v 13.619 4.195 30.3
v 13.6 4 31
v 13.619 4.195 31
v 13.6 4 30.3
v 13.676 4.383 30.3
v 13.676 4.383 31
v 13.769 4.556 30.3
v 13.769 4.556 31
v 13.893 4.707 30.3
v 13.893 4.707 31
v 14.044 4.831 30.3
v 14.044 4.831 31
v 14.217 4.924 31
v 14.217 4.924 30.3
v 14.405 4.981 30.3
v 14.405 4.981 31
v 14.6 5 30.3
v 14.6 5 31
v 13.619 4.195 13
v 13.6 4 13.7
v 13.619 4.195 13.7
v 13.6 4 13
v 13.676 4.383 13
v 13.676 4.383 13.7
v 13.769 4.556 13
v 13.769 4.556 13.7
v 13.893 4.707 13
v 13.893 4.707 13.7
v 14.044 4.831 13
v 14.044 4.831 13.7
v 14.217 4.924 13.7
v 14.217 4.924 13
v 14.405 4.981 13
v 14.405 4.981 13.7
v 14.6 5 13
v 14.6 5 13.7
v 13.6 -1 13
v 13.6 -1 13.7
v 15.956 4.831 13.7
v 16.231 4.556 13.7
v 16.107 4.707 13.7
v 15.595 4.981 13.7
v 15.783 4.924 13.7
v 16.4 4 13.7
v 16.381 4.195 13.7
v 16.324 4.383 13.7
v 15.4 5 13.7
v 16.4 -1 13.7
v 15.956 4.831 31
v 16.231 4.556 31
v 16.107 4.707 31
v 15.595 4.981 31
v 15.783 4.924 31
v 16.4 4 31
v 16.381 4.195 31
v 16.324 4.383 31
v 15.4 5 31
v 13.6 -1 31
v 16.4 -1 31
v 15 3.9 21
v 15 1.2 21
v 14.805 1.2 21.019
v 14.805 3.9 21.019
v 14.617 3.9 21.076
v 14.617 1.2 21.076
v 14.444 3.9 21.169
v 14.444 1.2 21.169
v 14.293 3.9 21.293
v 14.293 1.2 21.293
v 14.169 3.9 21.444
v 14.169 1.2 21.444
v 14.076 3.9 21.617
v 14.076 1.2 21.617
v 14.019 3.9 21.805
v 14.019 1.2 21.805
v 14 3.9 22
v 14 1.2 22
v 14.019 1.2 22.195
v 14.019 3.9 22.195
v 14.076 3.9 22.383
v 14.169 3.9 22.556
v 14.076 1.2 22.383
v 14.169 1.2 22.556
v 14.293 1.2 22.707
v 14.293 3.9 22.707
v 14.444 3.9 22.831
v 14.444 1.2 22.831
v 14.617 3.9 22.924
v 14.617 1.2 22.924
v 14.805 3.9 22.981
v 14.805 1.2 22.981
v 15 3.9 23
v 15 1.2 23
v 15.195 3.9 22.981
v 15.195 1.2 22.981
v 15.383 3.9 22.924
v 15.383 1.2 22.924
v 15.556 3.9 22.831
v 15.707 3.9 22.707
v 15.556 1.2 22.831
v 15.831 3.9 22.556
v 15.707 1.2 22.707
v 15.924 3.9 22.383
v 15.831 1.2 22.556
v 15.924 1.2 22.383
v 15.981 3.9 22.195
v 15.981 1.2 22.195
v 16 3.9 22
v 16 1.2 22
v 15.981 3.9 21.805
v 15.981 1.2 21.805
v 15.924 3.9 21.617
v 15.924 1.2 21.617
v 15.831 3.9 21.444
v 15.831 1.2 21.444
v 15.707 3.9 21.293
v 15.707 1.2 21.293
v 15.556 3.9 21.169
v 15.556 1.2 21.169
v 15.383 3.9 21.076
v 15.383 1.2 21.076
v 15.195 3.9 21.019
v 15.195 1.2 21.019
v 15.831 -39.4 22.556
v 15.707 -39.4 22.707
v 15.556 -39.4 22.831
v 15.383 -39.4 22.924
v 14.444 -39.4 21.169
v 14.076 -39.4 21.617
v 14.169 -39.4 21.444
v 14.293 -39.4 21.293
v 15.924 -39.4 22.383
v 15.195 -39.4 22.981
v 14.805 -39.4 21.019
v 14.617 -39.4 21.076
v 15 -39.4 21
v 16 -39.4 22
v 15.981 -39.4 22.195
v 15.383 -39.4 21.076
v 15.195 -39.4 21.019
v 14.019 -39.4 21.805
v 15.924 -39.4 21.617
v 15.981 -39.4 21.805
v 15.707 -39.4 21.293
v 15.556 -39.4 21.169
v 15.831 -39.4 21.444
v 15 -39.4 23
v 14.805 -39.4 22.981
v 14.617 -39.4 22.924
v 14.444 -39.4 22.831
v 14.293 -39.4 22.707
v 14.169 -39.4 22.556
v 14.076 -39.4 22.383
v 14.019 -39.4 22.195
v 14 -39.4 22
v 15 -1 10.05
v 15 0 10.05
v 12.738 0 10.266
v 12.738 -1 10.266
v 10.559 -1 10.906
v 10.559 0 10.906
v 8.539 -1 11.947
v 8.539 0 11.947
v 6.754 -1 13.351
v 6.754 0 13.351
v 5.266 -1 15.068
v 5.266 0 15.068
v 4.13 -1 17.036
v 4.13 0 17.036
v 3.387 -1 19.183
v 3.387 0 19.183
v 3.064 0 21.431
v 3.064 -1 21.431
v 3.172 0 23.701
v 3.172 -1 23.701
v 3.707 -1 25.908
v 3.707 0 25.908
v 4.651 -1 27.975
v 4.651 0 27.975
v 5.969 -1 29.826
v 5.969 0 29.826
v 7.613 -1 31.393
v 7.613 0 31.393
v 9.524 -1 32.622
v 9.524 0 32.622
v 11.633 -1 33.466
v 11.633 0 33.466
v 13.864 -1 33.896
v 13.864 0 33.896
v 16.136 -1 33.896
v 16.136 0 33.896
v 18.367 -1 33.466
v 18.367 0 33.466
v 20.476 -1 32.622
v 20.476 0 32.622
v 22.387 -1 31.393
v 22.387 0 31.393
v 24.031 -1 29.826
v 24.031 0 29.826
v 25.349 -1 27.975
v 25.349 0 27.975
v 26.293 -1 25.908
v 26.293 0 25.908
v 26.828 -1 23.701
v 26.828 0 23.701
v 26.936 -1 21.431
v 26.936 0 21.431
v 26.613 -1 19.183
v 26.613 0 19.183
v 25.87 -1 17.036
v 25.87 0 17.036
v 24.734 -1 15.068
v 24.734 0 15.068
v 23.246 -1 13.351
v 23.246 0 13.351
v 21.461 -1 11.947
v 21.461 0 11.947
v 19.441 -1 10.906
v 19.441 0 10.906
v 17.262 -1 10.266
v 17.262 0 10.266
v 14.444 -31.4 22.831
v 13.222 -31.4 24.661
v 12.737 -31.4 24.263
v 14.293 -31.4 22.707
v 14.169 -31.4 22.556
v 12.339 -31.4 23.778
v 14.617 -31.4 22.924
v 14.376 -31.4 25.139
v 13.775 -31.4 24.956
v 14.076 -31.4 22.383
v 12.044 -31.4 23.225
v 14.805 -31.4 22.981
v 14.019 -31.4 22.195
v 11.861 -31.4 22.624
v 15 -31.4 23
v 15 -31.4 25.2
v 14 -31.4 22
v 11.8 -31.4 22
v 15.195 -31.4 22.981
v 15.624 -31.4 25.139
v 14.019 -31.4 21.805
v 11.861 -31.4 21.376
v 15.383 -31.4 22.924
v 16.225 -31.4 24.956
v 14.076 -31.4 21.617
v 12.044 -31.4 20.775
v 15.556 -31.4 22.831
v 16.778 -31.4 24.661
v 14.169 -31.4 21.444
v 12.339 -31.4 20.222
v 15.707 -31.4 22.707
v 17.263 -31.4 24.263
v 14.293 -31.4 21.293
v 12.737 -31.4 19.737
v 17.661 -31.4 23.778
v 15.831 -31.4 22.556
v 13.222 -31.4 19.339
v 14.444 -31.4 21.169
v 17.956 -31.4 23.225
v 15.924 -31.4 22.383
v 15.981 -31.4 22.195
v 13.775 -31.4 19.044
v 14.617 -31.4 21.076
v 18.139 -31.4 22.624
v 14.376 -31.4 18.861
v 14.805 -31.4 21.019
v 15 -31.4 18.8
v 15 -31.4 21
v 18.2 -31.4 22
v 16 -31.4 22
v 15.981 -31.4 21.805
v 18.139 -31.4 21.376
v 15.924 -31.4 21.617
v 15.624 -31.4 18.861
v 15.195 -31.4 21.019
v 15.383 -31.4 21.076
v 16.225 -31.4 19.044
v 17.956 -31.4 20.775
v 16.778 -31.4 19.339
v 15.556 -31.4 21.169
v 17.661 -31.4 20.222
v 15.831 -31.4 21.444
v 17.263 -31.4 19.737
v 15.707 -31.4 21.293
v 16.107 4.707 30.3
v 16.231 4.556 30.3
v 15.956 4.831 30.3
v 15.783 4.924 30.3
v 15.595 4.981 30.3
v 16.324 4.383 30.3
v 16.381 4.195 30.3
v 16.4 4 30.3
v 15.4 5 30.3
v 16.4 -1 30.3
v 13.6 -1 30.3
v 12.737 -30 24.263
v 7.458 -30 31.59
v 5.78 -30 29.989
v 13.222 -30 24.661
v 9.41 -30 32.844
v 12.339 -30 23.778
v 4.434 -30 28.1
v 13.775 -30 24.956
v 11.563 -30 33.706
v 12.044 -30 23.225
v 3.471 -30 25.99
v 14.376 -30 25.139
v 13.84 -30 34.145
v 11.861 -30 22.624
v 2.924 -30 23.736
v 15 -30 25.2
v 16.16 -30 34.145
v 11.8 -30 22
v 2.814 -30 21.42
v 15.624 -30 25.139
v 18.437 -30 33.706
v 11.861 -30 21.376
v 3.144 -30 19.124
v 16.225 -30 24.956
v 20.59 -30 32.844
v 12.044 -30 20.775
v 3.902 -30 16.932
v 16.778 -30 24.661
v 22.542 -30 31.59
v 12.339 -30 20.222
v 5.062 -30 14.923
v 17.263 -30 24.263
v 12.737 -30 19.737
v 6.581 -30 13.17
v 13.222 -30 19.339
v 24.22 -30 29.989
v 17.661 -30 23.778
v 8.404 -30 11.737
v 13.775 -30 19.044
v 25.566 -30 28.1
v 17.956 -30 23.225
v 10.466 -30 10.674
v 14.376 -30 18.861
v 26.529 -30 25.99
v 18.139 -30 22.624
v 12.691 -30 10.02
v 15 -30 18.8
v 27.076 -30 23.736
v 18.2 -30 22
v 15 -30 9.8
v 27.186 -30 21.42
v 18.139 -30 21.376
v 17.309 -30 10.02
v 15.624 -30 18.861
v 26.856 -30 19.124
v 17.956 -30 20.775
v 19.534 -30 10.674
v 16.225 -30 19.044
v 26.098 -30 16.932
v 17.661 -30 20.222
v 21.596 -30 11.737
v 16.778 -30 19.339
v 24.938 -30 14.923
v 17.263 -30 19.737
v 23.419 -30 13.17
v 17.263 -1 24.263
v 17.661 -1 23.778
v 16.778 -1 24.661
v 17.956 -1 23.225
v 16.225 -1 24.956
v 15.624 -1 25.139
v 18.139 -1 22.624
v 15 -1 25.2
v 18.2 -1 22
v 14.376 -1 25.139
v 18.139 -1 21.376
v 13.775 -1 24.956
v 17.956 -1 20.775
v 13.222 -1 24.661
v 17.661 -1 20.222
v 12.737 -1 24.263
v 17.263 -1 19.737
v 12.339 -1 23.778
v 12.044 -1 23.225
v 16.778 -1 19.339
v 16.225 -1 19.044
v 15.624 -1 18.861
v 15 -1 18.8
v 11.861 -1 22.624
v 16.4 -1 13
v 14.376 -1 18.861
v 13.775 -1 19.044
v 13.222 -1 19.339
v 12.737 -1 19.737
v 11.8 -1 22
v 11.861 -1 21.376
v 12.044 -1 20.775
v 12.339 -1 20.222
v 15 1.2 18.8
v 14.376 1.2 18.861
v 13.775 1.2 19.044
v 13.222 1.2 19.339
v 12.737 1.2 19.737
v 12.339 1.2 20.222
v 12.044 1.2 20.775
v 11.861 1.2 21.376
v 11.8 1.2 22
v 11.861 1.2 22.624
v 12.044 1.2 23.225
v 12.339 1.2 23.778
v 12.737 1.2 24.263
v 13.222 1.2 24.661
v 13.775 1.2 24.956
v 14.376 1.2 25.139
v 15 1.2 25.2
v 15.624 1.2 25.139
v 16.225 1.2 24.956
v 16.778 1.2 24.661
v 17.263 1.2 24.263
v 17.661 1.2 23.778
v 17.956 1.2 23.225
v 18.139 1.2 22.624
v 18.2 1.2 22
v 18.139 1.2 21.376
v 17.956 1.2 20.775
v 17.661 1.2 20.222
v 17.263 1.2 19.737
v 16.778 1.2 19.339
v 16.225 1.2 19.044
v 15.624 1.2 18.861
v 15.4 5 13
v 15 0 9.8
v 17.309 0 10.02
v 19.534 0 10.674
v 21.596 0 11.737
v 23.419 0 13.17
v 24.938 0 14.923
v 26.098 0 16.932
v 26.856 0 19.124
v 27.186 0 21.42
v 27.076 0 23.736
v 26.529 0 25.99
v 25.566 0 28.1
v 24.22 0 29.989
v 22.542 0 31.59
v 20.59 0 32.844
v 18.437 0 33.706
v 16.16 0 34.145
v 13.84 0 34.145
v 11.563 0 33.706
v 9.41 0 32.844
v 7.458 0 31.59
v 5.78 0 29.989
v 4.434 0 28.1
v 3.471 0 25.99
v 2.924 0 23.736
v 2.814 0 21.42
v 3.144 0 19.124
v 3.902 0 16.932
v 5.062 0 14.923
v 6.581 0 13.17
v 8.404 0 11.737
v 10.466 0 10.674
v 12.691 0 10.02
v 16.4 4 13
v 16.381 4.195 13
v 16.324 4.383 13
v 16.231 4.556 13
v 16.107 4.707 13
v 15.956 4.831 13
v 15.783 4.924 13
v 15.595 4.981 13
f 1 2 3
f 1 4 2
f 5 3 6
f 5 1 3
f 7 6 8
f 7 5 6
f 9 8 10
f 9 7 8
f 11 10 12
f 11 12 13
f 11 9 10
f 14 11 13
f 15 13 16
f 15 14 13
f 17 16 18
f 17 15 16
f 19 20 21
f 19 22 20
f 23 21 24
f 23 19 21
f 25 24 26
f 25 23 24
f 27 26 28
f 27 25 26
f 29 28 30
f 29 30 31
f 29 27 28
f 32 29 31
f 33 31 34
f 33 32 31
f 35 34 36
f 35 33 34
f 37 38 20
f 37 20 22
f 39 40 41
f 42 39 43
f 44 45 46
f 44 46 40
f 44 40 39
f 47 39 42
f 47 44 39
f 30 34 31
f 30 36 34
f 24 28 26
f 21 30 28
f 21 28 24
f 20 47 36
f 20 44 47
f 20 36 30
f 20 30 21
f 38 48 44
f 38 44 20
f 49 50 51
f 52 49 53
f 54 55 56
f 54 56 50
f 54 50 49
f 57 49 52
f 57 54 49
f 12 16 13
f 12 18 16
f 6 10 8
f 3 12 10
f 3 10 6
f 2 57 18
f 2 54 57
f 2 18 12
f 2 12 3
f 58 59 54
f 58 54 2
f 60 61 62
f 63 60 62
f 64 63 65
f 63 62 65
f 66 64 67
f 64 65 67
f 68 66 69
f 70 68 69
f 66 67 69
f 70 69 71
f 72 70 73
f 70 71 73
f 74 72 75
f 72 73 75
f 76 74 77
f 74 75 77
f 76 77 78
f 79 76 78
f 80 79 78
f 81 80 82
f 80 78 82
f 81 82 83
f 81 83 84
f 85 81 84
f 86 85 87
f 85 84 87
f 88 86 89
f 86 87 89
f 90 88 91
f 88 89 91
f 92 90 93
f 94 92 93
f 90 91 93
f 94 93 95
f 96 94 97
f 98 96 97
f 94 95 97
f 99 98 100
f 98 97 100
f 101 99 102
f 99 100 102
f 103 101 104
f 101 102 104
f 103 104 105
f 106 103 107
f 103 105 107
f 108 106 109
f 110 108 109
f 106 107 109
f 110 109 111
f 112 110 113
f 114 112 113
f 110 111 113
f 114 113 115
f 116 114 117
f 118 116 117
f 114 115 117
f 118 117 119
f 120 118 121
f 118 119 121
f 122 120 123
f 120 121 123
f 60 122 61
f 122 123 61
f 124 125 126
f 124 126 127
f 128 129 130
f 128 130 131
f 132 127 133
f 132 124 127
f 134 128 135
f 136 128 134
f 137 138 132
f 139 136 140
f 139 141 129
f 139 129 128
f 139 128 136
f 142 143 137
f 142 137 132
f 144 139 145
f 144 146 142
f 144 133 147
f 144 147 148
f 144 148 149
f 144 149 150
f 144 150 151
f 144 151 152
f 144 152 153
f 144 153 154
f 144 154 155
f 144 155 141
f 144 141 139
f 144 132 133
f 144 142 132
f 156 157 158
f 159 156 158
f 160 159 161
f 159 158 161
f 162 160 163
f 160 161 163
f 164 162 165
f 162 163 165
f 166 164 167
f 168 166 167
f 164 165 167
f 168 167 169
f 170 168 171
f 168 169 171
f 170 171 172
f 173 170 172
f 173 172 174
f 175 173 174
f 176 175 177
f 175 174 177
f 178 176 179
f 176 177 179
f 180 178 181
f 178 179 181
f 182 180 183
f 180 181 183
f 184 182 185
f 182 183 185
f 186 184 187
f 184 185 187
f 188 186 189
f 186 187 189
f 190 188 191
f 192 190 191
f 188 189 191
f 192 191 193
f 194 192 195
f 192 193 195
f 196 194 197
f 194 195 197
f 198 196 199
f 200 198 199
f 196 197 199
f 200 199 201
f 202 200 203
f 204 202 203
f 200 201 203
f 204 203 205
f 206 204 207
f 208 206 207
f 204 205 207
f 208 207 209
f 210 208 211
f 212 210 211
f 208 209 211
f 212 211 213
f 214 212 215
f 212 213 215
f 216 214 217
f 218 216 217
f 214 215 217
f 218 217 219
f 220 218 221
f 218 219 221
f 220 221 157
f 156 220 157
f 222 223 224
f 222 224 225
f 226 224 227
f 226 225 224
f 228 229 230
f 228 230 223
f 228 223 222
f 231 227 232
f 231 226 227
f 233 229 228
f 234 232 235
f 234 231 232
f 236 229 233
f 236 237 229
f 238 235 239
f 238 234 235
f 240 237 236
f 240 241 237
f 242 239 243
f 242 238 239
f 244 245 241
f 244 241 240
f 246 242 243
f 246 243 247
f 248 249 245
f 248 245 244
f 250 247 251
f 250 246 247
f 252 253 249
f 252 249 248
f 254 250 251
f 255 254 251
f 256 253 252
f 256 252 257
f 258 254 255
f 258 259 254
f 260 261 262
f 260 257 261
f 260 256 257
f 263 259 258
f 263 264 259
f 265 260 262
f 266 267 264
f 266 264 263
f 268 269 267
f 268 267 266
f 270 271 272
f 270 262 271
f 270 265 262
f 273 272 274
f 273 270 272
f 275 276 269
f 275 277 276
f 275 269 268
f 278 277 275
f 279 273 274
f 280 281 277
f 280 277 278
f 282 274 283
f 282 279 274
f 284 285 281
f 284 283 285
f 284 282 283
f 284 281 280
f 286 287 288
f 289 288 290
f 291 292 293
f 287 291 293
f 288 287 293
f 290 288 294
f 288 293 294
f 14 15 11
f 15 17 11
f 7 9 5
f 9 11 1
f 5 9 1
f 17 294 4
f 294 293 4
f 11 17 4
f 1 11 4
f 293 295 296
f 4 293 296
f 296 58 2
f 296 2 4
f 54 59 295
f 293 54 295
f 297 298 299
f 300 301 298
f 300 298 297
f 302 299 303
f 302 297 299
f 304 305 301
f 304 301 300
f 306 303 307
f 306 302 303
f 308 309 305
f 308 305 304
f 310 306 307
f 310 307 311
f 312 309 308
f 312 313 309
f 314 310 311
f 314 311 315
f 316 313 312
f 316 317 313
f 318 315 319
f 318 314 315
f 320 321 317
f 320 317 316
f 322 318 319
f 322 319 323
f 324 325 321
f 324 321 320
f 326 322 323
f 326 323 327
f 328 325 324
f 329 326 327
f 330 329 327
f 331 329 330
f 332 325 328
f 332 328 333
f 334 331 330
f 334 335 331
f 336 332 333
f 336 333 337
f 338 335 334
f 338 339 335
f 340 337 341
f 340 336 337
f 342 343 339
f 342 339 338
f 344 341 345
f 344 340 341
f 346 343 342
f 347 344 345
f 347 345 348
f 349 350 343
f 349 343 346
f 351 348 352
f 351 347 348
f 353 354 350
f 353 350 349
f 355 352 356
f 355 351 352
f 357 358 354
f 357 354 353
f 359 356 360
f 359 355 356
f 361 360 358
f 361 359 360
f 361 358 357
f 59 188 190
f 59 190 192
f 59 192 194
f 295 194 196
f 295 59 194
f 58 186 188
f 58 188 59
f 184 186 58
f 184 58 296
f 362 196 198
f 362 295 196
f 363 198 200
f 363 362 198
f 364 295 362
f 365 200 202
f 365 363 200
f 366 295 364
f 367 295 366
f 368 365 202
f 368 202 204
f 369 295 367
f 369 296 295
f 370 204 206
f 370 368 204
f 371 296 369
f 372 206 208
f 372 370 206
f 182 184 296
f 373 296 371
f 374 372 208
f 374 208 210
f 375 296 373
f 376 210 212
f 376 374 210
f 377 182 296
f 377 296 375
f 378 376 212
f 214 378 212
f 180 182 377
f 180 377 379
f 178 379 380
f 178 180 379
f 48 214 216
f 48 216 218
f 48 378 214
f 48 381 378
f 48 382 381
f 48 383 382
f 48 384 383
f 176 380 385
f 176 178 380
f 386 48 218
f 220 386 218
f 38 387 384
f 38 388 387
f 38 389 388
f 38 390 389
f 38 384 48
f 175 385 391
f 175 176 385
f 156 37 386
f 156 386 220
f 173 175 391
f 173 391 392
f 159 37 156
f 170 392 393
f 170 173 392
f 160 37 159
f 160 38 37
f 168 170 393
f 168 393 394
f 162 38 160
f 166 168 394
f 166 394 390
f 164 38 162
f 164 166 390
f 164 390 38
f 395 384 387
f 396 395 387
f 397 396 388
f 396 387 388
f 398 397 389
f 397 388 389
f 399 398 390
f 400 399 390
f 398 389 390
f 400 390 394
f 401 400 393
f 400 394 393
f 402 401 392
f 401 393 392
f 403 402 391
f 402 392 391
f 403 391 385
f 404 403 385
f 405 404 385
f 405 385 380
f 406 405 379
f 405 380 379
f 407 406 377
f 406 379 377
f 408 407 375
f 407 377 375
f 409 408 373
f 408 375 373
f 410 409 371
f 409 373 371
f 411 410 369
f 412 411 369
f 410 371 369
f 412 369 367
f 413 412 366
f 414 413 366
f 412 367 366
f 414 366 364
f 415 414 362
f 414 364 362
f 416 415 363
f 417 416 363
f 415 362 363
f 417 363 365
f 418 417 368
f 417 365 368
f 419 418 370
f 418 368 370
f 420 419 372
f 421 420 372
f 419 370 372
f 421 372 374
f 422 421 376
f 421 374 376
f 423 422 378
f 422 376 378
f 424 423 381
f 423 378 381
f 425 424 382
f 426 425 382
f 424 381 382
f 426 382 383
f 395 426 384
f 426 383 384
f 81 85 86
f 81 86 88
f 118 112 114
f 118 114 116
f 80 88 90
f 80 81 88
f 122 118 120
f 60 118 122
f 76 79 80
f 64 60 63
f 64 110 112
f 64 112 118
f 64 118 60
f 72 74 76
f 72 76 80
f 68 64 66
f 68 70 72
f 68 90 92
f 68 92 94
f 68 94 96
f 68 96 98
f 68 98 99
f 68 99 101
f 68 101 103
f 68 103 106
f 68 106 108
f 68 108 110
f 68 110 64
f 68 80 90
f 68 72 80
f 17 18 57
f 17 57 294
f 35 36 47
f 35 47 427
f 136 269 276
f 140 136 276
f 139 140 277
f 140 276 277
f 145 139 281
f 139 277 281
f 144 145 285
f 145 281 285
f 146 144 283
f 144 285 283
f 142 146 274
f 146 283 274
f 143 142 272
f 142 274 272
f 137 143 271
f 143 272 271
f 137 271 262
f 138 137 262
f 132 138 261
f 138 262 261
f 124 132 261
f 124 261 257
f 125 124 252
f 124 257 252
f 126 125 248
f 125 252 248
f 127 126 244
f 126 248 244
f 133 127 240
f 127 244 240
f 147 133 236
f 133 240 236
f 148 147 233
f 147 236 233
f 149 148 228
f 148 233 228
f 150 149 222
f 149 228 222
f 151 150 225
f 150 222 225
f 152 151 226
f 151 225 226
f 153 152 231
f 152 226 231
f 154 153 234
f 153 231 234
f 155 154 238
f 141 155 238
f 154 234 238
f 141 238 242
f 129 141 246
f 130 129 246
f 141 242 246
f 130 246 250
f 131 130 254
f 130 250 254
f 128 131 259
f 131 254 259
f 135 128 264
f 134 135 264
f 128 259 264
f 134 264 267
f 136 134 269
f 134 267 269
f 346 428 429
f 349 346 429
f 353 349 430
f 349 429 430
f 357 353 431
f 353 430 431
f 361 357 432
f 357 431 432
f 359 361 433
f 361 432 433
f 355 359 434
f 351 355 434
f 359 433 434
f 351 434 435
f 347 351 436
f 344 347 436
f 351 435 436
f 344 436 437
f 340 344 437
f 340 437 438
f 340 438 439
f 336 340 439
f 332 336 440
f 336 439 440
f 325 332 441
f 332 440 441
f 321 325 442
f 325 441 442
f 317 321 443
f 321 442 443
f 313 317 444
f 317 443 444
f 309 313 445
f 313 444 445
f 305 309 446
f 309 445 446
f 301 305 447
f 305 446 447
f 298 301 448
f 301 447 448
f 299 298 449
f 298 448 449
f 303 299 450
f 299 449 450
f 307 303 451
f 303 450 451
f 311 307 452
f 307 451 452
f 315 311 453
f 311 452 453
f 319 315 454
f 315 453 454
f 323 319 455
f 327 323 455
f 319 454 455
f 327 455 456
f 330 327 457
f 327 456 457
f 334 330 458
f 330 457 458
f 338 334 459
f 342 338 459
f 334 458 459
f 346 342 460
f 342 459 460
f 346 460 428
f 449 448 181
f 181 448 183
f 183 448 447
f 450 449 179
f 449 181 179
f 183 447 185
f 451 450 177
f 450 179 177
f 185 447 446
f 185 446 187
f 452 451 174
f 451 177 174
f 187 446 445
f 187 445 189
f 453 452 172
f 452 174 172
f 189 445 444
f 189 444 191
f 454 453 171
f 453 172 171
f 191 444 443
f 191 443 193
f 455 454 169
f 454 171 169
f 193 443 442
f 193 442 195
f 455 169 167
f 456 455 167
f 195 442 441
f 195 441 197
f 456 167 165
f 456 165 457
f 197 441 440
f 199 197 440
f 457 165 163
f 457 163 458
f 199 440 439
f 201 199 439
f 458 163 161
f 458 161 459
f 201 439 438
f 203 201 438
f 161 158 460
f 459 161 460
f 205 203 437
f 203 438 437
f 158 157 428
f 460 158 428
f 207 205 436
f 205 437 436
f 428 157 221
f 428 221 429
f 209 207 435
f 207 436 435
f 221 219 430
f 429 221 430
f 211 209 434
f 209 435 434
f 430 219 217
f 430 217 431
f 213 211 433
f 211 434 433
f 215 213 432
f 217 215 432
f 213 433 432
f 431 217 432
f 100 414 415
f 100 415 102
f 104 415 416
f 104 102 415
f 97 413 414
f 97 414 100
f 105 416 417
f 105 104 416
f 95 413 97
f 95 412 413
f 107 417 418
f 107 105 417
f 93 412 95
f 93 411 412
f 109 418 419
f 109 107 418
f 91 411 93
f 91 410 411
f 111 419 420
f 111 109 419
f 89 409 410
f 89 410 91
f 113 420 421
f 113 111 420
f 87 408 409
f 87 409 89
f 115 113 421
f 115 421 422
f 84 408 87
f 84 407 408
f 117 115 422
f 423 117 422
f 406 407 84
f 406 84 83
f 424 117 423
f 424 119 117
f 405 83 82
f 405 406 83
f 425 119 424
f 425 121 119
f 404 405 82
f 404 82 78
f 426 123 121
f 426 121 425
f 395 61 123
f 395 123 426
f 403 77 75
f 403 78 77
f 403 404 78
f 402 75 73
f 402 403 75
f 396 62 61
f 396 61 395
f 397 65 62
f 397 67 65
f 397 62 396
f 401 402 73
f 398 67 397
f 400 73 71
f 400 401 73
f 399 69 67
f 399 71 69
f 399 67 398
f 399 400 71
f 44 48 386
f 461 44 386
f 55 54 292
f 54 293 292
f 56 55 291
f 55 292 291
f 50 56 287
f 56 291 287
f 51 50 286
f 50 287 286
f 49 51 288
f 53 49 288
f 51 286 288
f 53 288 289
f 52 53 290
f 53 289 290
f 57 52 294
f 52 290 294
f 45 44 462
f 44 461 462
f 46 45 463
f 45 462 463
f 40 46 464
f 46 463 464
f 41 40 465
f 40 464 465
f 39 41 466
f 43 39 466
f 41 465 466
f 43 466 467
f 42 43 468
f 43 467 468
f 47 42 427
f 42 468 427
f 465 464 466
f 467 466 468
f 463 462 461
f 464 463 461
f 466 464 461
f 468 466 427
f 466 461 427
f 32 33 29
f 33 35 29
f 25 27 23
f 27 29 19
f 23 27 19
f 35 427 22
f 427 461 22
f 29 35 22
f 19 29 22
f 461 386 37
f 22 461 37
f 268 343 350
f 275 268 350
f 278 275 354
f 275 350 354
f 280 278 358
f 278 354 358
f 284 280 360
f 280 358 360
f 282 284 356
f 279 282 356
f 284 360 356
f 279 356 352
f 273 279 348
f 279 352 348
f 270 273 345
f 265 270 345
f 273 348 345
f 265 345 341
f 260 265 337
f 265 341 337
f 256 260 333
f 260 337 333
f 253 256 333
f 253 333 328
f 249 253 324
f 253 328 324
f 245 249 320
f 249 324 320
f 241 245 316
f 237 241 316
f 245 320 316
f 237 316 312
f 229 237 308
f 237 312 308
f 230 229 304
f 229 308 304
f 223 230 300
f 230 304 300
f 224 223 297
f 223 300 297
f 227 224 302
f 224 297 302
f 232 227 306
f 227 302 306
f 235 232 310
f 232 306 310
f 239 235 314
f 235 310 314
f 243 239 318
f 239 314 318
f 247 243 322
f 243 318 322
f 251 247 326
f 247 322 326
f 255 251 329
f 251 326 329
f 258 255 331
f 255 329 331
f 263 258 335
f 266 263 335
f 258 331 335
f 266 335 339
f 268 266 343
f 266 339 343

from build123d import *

# Parameters (mm, degrees)
SKETCH094_R             = 12.2
PAD046_DEPTH            = 30
SKETCH095_R             = 3.2
PAD042_DEPTH            = 1.4
SKETCH100_R             = 1
PAD045_DEPTH            = 8
SKETCH098_R             = 11.95
POCKET040_DEPTH         = 1
SKETCH096_R             = 3.2
PAD047_DEPTH            = 2.2
SKETCH099_R             = 1
PAD044_DEPTH            = 2.7
SKETCH097_W             = 0.7
SKETCH097_H             = 2.8
PAD043_DEPTH            = 6
FILLET018_R             = 1
BODY016_PITCH_ANGLE     = 90
BODY016_PLACEMENT_ANGLE = -90


with BuildPart() as part:
    # Sketch094 → Pad046 (new body)
    with BuildSketch(Plane.XY):
        Circle(SKETCH094_R)
    extrude(amount=PAD046_DEPTH)

    # Sketch095 (on Face3 of Pad046) → Pad042 (join)
    with BuildSketch(Plane.XY.offset(30)):
        Circle(SKETCH095_R)
    extrude(amount=PAD042_DEPTH)

    # Sketch100 (on Face5 of Pad042) → Pad045 (join)
    with BuildSketch(Plane.XY.offset(31.4)):
        Circle(SKETCH100_R)
    extrude(amount=PAD045_DEPTH)

    # Sketch098 (on Face2 of Pad045) → Pocket040 (cut)
    with BuildSketch(Plane(origin=(0, 0, 0), x_dir=(1, 0, 0), z_dir=(0, 0, -1))):
        Circle(SKETCH098_R)
    extrude(amount=-POCKET040_DEPTH, mode=Mode.SUBTRACT)

    # Sketch096 (on Face6 of Pocket040) → Pad047 (join)
    with BuildSketch(Plane(origin=(0, 0, 1), x_dir=(1, 0, 0), z_dir=(0, 0, -1))):
        Circle(SKETCH096_R)
    extrude(amount=PAD047_DEPTH)

    # Sketch099 (on Face10 of Pad047) → Pad044 (join)
    with BuildSketch(Plane(origin=(0, 0, -1.2), x_dir=(1, 0, 0), z_dir=(0, 0, -1))):
        Circle(SKETCH099_R)
    extrude(amount=PAD044_DEPTH)

    # Sketch097 (on Face6 of Pad044) → Pad043 (join)
    with BuildSketch(Plane(origin=(0, 0, 1), x_dir=(1, 0, 0), z_dir=(0, 0, -1))):
        with Locations((-8.65, 0)):
            Rectangle(SKETCH097_W, SKETCH097_H)
        with Locations((8.65, 0)):
            Rectangle(SKETCH097_W, SKETCH097_H)
    extrude(amount=PAD043_DEPTH)

    # Fillet018
    fillet018_edges = [part.edges().sort_by_distance(p)[0] for p in [
        (-8.65, -1.4, -5),
        (-8.65, 1.4, -5),
        (8.65, -1.4, -5),
        (8.65, 1.4, -5),
    ]]
    fillet(fillet018_edges, radius=FILLET018_R)


with BuildPart() as part_1:
    # Body016 pitch: moved
    add(part.part.rotate(Axis((0, 0, 0), (0, 1, 0)), BODY016_PITCH_ANGLE))


with BuildPart() as part_2:
    # Body016 placement: moved
    add(part_1.part.moved(Location((15, 0, 22))).rotate(Axis((15, 0, 22), (0, 0, 1)), BODY016_PLACEMENT_ANGLE))


solid = part_2.part
